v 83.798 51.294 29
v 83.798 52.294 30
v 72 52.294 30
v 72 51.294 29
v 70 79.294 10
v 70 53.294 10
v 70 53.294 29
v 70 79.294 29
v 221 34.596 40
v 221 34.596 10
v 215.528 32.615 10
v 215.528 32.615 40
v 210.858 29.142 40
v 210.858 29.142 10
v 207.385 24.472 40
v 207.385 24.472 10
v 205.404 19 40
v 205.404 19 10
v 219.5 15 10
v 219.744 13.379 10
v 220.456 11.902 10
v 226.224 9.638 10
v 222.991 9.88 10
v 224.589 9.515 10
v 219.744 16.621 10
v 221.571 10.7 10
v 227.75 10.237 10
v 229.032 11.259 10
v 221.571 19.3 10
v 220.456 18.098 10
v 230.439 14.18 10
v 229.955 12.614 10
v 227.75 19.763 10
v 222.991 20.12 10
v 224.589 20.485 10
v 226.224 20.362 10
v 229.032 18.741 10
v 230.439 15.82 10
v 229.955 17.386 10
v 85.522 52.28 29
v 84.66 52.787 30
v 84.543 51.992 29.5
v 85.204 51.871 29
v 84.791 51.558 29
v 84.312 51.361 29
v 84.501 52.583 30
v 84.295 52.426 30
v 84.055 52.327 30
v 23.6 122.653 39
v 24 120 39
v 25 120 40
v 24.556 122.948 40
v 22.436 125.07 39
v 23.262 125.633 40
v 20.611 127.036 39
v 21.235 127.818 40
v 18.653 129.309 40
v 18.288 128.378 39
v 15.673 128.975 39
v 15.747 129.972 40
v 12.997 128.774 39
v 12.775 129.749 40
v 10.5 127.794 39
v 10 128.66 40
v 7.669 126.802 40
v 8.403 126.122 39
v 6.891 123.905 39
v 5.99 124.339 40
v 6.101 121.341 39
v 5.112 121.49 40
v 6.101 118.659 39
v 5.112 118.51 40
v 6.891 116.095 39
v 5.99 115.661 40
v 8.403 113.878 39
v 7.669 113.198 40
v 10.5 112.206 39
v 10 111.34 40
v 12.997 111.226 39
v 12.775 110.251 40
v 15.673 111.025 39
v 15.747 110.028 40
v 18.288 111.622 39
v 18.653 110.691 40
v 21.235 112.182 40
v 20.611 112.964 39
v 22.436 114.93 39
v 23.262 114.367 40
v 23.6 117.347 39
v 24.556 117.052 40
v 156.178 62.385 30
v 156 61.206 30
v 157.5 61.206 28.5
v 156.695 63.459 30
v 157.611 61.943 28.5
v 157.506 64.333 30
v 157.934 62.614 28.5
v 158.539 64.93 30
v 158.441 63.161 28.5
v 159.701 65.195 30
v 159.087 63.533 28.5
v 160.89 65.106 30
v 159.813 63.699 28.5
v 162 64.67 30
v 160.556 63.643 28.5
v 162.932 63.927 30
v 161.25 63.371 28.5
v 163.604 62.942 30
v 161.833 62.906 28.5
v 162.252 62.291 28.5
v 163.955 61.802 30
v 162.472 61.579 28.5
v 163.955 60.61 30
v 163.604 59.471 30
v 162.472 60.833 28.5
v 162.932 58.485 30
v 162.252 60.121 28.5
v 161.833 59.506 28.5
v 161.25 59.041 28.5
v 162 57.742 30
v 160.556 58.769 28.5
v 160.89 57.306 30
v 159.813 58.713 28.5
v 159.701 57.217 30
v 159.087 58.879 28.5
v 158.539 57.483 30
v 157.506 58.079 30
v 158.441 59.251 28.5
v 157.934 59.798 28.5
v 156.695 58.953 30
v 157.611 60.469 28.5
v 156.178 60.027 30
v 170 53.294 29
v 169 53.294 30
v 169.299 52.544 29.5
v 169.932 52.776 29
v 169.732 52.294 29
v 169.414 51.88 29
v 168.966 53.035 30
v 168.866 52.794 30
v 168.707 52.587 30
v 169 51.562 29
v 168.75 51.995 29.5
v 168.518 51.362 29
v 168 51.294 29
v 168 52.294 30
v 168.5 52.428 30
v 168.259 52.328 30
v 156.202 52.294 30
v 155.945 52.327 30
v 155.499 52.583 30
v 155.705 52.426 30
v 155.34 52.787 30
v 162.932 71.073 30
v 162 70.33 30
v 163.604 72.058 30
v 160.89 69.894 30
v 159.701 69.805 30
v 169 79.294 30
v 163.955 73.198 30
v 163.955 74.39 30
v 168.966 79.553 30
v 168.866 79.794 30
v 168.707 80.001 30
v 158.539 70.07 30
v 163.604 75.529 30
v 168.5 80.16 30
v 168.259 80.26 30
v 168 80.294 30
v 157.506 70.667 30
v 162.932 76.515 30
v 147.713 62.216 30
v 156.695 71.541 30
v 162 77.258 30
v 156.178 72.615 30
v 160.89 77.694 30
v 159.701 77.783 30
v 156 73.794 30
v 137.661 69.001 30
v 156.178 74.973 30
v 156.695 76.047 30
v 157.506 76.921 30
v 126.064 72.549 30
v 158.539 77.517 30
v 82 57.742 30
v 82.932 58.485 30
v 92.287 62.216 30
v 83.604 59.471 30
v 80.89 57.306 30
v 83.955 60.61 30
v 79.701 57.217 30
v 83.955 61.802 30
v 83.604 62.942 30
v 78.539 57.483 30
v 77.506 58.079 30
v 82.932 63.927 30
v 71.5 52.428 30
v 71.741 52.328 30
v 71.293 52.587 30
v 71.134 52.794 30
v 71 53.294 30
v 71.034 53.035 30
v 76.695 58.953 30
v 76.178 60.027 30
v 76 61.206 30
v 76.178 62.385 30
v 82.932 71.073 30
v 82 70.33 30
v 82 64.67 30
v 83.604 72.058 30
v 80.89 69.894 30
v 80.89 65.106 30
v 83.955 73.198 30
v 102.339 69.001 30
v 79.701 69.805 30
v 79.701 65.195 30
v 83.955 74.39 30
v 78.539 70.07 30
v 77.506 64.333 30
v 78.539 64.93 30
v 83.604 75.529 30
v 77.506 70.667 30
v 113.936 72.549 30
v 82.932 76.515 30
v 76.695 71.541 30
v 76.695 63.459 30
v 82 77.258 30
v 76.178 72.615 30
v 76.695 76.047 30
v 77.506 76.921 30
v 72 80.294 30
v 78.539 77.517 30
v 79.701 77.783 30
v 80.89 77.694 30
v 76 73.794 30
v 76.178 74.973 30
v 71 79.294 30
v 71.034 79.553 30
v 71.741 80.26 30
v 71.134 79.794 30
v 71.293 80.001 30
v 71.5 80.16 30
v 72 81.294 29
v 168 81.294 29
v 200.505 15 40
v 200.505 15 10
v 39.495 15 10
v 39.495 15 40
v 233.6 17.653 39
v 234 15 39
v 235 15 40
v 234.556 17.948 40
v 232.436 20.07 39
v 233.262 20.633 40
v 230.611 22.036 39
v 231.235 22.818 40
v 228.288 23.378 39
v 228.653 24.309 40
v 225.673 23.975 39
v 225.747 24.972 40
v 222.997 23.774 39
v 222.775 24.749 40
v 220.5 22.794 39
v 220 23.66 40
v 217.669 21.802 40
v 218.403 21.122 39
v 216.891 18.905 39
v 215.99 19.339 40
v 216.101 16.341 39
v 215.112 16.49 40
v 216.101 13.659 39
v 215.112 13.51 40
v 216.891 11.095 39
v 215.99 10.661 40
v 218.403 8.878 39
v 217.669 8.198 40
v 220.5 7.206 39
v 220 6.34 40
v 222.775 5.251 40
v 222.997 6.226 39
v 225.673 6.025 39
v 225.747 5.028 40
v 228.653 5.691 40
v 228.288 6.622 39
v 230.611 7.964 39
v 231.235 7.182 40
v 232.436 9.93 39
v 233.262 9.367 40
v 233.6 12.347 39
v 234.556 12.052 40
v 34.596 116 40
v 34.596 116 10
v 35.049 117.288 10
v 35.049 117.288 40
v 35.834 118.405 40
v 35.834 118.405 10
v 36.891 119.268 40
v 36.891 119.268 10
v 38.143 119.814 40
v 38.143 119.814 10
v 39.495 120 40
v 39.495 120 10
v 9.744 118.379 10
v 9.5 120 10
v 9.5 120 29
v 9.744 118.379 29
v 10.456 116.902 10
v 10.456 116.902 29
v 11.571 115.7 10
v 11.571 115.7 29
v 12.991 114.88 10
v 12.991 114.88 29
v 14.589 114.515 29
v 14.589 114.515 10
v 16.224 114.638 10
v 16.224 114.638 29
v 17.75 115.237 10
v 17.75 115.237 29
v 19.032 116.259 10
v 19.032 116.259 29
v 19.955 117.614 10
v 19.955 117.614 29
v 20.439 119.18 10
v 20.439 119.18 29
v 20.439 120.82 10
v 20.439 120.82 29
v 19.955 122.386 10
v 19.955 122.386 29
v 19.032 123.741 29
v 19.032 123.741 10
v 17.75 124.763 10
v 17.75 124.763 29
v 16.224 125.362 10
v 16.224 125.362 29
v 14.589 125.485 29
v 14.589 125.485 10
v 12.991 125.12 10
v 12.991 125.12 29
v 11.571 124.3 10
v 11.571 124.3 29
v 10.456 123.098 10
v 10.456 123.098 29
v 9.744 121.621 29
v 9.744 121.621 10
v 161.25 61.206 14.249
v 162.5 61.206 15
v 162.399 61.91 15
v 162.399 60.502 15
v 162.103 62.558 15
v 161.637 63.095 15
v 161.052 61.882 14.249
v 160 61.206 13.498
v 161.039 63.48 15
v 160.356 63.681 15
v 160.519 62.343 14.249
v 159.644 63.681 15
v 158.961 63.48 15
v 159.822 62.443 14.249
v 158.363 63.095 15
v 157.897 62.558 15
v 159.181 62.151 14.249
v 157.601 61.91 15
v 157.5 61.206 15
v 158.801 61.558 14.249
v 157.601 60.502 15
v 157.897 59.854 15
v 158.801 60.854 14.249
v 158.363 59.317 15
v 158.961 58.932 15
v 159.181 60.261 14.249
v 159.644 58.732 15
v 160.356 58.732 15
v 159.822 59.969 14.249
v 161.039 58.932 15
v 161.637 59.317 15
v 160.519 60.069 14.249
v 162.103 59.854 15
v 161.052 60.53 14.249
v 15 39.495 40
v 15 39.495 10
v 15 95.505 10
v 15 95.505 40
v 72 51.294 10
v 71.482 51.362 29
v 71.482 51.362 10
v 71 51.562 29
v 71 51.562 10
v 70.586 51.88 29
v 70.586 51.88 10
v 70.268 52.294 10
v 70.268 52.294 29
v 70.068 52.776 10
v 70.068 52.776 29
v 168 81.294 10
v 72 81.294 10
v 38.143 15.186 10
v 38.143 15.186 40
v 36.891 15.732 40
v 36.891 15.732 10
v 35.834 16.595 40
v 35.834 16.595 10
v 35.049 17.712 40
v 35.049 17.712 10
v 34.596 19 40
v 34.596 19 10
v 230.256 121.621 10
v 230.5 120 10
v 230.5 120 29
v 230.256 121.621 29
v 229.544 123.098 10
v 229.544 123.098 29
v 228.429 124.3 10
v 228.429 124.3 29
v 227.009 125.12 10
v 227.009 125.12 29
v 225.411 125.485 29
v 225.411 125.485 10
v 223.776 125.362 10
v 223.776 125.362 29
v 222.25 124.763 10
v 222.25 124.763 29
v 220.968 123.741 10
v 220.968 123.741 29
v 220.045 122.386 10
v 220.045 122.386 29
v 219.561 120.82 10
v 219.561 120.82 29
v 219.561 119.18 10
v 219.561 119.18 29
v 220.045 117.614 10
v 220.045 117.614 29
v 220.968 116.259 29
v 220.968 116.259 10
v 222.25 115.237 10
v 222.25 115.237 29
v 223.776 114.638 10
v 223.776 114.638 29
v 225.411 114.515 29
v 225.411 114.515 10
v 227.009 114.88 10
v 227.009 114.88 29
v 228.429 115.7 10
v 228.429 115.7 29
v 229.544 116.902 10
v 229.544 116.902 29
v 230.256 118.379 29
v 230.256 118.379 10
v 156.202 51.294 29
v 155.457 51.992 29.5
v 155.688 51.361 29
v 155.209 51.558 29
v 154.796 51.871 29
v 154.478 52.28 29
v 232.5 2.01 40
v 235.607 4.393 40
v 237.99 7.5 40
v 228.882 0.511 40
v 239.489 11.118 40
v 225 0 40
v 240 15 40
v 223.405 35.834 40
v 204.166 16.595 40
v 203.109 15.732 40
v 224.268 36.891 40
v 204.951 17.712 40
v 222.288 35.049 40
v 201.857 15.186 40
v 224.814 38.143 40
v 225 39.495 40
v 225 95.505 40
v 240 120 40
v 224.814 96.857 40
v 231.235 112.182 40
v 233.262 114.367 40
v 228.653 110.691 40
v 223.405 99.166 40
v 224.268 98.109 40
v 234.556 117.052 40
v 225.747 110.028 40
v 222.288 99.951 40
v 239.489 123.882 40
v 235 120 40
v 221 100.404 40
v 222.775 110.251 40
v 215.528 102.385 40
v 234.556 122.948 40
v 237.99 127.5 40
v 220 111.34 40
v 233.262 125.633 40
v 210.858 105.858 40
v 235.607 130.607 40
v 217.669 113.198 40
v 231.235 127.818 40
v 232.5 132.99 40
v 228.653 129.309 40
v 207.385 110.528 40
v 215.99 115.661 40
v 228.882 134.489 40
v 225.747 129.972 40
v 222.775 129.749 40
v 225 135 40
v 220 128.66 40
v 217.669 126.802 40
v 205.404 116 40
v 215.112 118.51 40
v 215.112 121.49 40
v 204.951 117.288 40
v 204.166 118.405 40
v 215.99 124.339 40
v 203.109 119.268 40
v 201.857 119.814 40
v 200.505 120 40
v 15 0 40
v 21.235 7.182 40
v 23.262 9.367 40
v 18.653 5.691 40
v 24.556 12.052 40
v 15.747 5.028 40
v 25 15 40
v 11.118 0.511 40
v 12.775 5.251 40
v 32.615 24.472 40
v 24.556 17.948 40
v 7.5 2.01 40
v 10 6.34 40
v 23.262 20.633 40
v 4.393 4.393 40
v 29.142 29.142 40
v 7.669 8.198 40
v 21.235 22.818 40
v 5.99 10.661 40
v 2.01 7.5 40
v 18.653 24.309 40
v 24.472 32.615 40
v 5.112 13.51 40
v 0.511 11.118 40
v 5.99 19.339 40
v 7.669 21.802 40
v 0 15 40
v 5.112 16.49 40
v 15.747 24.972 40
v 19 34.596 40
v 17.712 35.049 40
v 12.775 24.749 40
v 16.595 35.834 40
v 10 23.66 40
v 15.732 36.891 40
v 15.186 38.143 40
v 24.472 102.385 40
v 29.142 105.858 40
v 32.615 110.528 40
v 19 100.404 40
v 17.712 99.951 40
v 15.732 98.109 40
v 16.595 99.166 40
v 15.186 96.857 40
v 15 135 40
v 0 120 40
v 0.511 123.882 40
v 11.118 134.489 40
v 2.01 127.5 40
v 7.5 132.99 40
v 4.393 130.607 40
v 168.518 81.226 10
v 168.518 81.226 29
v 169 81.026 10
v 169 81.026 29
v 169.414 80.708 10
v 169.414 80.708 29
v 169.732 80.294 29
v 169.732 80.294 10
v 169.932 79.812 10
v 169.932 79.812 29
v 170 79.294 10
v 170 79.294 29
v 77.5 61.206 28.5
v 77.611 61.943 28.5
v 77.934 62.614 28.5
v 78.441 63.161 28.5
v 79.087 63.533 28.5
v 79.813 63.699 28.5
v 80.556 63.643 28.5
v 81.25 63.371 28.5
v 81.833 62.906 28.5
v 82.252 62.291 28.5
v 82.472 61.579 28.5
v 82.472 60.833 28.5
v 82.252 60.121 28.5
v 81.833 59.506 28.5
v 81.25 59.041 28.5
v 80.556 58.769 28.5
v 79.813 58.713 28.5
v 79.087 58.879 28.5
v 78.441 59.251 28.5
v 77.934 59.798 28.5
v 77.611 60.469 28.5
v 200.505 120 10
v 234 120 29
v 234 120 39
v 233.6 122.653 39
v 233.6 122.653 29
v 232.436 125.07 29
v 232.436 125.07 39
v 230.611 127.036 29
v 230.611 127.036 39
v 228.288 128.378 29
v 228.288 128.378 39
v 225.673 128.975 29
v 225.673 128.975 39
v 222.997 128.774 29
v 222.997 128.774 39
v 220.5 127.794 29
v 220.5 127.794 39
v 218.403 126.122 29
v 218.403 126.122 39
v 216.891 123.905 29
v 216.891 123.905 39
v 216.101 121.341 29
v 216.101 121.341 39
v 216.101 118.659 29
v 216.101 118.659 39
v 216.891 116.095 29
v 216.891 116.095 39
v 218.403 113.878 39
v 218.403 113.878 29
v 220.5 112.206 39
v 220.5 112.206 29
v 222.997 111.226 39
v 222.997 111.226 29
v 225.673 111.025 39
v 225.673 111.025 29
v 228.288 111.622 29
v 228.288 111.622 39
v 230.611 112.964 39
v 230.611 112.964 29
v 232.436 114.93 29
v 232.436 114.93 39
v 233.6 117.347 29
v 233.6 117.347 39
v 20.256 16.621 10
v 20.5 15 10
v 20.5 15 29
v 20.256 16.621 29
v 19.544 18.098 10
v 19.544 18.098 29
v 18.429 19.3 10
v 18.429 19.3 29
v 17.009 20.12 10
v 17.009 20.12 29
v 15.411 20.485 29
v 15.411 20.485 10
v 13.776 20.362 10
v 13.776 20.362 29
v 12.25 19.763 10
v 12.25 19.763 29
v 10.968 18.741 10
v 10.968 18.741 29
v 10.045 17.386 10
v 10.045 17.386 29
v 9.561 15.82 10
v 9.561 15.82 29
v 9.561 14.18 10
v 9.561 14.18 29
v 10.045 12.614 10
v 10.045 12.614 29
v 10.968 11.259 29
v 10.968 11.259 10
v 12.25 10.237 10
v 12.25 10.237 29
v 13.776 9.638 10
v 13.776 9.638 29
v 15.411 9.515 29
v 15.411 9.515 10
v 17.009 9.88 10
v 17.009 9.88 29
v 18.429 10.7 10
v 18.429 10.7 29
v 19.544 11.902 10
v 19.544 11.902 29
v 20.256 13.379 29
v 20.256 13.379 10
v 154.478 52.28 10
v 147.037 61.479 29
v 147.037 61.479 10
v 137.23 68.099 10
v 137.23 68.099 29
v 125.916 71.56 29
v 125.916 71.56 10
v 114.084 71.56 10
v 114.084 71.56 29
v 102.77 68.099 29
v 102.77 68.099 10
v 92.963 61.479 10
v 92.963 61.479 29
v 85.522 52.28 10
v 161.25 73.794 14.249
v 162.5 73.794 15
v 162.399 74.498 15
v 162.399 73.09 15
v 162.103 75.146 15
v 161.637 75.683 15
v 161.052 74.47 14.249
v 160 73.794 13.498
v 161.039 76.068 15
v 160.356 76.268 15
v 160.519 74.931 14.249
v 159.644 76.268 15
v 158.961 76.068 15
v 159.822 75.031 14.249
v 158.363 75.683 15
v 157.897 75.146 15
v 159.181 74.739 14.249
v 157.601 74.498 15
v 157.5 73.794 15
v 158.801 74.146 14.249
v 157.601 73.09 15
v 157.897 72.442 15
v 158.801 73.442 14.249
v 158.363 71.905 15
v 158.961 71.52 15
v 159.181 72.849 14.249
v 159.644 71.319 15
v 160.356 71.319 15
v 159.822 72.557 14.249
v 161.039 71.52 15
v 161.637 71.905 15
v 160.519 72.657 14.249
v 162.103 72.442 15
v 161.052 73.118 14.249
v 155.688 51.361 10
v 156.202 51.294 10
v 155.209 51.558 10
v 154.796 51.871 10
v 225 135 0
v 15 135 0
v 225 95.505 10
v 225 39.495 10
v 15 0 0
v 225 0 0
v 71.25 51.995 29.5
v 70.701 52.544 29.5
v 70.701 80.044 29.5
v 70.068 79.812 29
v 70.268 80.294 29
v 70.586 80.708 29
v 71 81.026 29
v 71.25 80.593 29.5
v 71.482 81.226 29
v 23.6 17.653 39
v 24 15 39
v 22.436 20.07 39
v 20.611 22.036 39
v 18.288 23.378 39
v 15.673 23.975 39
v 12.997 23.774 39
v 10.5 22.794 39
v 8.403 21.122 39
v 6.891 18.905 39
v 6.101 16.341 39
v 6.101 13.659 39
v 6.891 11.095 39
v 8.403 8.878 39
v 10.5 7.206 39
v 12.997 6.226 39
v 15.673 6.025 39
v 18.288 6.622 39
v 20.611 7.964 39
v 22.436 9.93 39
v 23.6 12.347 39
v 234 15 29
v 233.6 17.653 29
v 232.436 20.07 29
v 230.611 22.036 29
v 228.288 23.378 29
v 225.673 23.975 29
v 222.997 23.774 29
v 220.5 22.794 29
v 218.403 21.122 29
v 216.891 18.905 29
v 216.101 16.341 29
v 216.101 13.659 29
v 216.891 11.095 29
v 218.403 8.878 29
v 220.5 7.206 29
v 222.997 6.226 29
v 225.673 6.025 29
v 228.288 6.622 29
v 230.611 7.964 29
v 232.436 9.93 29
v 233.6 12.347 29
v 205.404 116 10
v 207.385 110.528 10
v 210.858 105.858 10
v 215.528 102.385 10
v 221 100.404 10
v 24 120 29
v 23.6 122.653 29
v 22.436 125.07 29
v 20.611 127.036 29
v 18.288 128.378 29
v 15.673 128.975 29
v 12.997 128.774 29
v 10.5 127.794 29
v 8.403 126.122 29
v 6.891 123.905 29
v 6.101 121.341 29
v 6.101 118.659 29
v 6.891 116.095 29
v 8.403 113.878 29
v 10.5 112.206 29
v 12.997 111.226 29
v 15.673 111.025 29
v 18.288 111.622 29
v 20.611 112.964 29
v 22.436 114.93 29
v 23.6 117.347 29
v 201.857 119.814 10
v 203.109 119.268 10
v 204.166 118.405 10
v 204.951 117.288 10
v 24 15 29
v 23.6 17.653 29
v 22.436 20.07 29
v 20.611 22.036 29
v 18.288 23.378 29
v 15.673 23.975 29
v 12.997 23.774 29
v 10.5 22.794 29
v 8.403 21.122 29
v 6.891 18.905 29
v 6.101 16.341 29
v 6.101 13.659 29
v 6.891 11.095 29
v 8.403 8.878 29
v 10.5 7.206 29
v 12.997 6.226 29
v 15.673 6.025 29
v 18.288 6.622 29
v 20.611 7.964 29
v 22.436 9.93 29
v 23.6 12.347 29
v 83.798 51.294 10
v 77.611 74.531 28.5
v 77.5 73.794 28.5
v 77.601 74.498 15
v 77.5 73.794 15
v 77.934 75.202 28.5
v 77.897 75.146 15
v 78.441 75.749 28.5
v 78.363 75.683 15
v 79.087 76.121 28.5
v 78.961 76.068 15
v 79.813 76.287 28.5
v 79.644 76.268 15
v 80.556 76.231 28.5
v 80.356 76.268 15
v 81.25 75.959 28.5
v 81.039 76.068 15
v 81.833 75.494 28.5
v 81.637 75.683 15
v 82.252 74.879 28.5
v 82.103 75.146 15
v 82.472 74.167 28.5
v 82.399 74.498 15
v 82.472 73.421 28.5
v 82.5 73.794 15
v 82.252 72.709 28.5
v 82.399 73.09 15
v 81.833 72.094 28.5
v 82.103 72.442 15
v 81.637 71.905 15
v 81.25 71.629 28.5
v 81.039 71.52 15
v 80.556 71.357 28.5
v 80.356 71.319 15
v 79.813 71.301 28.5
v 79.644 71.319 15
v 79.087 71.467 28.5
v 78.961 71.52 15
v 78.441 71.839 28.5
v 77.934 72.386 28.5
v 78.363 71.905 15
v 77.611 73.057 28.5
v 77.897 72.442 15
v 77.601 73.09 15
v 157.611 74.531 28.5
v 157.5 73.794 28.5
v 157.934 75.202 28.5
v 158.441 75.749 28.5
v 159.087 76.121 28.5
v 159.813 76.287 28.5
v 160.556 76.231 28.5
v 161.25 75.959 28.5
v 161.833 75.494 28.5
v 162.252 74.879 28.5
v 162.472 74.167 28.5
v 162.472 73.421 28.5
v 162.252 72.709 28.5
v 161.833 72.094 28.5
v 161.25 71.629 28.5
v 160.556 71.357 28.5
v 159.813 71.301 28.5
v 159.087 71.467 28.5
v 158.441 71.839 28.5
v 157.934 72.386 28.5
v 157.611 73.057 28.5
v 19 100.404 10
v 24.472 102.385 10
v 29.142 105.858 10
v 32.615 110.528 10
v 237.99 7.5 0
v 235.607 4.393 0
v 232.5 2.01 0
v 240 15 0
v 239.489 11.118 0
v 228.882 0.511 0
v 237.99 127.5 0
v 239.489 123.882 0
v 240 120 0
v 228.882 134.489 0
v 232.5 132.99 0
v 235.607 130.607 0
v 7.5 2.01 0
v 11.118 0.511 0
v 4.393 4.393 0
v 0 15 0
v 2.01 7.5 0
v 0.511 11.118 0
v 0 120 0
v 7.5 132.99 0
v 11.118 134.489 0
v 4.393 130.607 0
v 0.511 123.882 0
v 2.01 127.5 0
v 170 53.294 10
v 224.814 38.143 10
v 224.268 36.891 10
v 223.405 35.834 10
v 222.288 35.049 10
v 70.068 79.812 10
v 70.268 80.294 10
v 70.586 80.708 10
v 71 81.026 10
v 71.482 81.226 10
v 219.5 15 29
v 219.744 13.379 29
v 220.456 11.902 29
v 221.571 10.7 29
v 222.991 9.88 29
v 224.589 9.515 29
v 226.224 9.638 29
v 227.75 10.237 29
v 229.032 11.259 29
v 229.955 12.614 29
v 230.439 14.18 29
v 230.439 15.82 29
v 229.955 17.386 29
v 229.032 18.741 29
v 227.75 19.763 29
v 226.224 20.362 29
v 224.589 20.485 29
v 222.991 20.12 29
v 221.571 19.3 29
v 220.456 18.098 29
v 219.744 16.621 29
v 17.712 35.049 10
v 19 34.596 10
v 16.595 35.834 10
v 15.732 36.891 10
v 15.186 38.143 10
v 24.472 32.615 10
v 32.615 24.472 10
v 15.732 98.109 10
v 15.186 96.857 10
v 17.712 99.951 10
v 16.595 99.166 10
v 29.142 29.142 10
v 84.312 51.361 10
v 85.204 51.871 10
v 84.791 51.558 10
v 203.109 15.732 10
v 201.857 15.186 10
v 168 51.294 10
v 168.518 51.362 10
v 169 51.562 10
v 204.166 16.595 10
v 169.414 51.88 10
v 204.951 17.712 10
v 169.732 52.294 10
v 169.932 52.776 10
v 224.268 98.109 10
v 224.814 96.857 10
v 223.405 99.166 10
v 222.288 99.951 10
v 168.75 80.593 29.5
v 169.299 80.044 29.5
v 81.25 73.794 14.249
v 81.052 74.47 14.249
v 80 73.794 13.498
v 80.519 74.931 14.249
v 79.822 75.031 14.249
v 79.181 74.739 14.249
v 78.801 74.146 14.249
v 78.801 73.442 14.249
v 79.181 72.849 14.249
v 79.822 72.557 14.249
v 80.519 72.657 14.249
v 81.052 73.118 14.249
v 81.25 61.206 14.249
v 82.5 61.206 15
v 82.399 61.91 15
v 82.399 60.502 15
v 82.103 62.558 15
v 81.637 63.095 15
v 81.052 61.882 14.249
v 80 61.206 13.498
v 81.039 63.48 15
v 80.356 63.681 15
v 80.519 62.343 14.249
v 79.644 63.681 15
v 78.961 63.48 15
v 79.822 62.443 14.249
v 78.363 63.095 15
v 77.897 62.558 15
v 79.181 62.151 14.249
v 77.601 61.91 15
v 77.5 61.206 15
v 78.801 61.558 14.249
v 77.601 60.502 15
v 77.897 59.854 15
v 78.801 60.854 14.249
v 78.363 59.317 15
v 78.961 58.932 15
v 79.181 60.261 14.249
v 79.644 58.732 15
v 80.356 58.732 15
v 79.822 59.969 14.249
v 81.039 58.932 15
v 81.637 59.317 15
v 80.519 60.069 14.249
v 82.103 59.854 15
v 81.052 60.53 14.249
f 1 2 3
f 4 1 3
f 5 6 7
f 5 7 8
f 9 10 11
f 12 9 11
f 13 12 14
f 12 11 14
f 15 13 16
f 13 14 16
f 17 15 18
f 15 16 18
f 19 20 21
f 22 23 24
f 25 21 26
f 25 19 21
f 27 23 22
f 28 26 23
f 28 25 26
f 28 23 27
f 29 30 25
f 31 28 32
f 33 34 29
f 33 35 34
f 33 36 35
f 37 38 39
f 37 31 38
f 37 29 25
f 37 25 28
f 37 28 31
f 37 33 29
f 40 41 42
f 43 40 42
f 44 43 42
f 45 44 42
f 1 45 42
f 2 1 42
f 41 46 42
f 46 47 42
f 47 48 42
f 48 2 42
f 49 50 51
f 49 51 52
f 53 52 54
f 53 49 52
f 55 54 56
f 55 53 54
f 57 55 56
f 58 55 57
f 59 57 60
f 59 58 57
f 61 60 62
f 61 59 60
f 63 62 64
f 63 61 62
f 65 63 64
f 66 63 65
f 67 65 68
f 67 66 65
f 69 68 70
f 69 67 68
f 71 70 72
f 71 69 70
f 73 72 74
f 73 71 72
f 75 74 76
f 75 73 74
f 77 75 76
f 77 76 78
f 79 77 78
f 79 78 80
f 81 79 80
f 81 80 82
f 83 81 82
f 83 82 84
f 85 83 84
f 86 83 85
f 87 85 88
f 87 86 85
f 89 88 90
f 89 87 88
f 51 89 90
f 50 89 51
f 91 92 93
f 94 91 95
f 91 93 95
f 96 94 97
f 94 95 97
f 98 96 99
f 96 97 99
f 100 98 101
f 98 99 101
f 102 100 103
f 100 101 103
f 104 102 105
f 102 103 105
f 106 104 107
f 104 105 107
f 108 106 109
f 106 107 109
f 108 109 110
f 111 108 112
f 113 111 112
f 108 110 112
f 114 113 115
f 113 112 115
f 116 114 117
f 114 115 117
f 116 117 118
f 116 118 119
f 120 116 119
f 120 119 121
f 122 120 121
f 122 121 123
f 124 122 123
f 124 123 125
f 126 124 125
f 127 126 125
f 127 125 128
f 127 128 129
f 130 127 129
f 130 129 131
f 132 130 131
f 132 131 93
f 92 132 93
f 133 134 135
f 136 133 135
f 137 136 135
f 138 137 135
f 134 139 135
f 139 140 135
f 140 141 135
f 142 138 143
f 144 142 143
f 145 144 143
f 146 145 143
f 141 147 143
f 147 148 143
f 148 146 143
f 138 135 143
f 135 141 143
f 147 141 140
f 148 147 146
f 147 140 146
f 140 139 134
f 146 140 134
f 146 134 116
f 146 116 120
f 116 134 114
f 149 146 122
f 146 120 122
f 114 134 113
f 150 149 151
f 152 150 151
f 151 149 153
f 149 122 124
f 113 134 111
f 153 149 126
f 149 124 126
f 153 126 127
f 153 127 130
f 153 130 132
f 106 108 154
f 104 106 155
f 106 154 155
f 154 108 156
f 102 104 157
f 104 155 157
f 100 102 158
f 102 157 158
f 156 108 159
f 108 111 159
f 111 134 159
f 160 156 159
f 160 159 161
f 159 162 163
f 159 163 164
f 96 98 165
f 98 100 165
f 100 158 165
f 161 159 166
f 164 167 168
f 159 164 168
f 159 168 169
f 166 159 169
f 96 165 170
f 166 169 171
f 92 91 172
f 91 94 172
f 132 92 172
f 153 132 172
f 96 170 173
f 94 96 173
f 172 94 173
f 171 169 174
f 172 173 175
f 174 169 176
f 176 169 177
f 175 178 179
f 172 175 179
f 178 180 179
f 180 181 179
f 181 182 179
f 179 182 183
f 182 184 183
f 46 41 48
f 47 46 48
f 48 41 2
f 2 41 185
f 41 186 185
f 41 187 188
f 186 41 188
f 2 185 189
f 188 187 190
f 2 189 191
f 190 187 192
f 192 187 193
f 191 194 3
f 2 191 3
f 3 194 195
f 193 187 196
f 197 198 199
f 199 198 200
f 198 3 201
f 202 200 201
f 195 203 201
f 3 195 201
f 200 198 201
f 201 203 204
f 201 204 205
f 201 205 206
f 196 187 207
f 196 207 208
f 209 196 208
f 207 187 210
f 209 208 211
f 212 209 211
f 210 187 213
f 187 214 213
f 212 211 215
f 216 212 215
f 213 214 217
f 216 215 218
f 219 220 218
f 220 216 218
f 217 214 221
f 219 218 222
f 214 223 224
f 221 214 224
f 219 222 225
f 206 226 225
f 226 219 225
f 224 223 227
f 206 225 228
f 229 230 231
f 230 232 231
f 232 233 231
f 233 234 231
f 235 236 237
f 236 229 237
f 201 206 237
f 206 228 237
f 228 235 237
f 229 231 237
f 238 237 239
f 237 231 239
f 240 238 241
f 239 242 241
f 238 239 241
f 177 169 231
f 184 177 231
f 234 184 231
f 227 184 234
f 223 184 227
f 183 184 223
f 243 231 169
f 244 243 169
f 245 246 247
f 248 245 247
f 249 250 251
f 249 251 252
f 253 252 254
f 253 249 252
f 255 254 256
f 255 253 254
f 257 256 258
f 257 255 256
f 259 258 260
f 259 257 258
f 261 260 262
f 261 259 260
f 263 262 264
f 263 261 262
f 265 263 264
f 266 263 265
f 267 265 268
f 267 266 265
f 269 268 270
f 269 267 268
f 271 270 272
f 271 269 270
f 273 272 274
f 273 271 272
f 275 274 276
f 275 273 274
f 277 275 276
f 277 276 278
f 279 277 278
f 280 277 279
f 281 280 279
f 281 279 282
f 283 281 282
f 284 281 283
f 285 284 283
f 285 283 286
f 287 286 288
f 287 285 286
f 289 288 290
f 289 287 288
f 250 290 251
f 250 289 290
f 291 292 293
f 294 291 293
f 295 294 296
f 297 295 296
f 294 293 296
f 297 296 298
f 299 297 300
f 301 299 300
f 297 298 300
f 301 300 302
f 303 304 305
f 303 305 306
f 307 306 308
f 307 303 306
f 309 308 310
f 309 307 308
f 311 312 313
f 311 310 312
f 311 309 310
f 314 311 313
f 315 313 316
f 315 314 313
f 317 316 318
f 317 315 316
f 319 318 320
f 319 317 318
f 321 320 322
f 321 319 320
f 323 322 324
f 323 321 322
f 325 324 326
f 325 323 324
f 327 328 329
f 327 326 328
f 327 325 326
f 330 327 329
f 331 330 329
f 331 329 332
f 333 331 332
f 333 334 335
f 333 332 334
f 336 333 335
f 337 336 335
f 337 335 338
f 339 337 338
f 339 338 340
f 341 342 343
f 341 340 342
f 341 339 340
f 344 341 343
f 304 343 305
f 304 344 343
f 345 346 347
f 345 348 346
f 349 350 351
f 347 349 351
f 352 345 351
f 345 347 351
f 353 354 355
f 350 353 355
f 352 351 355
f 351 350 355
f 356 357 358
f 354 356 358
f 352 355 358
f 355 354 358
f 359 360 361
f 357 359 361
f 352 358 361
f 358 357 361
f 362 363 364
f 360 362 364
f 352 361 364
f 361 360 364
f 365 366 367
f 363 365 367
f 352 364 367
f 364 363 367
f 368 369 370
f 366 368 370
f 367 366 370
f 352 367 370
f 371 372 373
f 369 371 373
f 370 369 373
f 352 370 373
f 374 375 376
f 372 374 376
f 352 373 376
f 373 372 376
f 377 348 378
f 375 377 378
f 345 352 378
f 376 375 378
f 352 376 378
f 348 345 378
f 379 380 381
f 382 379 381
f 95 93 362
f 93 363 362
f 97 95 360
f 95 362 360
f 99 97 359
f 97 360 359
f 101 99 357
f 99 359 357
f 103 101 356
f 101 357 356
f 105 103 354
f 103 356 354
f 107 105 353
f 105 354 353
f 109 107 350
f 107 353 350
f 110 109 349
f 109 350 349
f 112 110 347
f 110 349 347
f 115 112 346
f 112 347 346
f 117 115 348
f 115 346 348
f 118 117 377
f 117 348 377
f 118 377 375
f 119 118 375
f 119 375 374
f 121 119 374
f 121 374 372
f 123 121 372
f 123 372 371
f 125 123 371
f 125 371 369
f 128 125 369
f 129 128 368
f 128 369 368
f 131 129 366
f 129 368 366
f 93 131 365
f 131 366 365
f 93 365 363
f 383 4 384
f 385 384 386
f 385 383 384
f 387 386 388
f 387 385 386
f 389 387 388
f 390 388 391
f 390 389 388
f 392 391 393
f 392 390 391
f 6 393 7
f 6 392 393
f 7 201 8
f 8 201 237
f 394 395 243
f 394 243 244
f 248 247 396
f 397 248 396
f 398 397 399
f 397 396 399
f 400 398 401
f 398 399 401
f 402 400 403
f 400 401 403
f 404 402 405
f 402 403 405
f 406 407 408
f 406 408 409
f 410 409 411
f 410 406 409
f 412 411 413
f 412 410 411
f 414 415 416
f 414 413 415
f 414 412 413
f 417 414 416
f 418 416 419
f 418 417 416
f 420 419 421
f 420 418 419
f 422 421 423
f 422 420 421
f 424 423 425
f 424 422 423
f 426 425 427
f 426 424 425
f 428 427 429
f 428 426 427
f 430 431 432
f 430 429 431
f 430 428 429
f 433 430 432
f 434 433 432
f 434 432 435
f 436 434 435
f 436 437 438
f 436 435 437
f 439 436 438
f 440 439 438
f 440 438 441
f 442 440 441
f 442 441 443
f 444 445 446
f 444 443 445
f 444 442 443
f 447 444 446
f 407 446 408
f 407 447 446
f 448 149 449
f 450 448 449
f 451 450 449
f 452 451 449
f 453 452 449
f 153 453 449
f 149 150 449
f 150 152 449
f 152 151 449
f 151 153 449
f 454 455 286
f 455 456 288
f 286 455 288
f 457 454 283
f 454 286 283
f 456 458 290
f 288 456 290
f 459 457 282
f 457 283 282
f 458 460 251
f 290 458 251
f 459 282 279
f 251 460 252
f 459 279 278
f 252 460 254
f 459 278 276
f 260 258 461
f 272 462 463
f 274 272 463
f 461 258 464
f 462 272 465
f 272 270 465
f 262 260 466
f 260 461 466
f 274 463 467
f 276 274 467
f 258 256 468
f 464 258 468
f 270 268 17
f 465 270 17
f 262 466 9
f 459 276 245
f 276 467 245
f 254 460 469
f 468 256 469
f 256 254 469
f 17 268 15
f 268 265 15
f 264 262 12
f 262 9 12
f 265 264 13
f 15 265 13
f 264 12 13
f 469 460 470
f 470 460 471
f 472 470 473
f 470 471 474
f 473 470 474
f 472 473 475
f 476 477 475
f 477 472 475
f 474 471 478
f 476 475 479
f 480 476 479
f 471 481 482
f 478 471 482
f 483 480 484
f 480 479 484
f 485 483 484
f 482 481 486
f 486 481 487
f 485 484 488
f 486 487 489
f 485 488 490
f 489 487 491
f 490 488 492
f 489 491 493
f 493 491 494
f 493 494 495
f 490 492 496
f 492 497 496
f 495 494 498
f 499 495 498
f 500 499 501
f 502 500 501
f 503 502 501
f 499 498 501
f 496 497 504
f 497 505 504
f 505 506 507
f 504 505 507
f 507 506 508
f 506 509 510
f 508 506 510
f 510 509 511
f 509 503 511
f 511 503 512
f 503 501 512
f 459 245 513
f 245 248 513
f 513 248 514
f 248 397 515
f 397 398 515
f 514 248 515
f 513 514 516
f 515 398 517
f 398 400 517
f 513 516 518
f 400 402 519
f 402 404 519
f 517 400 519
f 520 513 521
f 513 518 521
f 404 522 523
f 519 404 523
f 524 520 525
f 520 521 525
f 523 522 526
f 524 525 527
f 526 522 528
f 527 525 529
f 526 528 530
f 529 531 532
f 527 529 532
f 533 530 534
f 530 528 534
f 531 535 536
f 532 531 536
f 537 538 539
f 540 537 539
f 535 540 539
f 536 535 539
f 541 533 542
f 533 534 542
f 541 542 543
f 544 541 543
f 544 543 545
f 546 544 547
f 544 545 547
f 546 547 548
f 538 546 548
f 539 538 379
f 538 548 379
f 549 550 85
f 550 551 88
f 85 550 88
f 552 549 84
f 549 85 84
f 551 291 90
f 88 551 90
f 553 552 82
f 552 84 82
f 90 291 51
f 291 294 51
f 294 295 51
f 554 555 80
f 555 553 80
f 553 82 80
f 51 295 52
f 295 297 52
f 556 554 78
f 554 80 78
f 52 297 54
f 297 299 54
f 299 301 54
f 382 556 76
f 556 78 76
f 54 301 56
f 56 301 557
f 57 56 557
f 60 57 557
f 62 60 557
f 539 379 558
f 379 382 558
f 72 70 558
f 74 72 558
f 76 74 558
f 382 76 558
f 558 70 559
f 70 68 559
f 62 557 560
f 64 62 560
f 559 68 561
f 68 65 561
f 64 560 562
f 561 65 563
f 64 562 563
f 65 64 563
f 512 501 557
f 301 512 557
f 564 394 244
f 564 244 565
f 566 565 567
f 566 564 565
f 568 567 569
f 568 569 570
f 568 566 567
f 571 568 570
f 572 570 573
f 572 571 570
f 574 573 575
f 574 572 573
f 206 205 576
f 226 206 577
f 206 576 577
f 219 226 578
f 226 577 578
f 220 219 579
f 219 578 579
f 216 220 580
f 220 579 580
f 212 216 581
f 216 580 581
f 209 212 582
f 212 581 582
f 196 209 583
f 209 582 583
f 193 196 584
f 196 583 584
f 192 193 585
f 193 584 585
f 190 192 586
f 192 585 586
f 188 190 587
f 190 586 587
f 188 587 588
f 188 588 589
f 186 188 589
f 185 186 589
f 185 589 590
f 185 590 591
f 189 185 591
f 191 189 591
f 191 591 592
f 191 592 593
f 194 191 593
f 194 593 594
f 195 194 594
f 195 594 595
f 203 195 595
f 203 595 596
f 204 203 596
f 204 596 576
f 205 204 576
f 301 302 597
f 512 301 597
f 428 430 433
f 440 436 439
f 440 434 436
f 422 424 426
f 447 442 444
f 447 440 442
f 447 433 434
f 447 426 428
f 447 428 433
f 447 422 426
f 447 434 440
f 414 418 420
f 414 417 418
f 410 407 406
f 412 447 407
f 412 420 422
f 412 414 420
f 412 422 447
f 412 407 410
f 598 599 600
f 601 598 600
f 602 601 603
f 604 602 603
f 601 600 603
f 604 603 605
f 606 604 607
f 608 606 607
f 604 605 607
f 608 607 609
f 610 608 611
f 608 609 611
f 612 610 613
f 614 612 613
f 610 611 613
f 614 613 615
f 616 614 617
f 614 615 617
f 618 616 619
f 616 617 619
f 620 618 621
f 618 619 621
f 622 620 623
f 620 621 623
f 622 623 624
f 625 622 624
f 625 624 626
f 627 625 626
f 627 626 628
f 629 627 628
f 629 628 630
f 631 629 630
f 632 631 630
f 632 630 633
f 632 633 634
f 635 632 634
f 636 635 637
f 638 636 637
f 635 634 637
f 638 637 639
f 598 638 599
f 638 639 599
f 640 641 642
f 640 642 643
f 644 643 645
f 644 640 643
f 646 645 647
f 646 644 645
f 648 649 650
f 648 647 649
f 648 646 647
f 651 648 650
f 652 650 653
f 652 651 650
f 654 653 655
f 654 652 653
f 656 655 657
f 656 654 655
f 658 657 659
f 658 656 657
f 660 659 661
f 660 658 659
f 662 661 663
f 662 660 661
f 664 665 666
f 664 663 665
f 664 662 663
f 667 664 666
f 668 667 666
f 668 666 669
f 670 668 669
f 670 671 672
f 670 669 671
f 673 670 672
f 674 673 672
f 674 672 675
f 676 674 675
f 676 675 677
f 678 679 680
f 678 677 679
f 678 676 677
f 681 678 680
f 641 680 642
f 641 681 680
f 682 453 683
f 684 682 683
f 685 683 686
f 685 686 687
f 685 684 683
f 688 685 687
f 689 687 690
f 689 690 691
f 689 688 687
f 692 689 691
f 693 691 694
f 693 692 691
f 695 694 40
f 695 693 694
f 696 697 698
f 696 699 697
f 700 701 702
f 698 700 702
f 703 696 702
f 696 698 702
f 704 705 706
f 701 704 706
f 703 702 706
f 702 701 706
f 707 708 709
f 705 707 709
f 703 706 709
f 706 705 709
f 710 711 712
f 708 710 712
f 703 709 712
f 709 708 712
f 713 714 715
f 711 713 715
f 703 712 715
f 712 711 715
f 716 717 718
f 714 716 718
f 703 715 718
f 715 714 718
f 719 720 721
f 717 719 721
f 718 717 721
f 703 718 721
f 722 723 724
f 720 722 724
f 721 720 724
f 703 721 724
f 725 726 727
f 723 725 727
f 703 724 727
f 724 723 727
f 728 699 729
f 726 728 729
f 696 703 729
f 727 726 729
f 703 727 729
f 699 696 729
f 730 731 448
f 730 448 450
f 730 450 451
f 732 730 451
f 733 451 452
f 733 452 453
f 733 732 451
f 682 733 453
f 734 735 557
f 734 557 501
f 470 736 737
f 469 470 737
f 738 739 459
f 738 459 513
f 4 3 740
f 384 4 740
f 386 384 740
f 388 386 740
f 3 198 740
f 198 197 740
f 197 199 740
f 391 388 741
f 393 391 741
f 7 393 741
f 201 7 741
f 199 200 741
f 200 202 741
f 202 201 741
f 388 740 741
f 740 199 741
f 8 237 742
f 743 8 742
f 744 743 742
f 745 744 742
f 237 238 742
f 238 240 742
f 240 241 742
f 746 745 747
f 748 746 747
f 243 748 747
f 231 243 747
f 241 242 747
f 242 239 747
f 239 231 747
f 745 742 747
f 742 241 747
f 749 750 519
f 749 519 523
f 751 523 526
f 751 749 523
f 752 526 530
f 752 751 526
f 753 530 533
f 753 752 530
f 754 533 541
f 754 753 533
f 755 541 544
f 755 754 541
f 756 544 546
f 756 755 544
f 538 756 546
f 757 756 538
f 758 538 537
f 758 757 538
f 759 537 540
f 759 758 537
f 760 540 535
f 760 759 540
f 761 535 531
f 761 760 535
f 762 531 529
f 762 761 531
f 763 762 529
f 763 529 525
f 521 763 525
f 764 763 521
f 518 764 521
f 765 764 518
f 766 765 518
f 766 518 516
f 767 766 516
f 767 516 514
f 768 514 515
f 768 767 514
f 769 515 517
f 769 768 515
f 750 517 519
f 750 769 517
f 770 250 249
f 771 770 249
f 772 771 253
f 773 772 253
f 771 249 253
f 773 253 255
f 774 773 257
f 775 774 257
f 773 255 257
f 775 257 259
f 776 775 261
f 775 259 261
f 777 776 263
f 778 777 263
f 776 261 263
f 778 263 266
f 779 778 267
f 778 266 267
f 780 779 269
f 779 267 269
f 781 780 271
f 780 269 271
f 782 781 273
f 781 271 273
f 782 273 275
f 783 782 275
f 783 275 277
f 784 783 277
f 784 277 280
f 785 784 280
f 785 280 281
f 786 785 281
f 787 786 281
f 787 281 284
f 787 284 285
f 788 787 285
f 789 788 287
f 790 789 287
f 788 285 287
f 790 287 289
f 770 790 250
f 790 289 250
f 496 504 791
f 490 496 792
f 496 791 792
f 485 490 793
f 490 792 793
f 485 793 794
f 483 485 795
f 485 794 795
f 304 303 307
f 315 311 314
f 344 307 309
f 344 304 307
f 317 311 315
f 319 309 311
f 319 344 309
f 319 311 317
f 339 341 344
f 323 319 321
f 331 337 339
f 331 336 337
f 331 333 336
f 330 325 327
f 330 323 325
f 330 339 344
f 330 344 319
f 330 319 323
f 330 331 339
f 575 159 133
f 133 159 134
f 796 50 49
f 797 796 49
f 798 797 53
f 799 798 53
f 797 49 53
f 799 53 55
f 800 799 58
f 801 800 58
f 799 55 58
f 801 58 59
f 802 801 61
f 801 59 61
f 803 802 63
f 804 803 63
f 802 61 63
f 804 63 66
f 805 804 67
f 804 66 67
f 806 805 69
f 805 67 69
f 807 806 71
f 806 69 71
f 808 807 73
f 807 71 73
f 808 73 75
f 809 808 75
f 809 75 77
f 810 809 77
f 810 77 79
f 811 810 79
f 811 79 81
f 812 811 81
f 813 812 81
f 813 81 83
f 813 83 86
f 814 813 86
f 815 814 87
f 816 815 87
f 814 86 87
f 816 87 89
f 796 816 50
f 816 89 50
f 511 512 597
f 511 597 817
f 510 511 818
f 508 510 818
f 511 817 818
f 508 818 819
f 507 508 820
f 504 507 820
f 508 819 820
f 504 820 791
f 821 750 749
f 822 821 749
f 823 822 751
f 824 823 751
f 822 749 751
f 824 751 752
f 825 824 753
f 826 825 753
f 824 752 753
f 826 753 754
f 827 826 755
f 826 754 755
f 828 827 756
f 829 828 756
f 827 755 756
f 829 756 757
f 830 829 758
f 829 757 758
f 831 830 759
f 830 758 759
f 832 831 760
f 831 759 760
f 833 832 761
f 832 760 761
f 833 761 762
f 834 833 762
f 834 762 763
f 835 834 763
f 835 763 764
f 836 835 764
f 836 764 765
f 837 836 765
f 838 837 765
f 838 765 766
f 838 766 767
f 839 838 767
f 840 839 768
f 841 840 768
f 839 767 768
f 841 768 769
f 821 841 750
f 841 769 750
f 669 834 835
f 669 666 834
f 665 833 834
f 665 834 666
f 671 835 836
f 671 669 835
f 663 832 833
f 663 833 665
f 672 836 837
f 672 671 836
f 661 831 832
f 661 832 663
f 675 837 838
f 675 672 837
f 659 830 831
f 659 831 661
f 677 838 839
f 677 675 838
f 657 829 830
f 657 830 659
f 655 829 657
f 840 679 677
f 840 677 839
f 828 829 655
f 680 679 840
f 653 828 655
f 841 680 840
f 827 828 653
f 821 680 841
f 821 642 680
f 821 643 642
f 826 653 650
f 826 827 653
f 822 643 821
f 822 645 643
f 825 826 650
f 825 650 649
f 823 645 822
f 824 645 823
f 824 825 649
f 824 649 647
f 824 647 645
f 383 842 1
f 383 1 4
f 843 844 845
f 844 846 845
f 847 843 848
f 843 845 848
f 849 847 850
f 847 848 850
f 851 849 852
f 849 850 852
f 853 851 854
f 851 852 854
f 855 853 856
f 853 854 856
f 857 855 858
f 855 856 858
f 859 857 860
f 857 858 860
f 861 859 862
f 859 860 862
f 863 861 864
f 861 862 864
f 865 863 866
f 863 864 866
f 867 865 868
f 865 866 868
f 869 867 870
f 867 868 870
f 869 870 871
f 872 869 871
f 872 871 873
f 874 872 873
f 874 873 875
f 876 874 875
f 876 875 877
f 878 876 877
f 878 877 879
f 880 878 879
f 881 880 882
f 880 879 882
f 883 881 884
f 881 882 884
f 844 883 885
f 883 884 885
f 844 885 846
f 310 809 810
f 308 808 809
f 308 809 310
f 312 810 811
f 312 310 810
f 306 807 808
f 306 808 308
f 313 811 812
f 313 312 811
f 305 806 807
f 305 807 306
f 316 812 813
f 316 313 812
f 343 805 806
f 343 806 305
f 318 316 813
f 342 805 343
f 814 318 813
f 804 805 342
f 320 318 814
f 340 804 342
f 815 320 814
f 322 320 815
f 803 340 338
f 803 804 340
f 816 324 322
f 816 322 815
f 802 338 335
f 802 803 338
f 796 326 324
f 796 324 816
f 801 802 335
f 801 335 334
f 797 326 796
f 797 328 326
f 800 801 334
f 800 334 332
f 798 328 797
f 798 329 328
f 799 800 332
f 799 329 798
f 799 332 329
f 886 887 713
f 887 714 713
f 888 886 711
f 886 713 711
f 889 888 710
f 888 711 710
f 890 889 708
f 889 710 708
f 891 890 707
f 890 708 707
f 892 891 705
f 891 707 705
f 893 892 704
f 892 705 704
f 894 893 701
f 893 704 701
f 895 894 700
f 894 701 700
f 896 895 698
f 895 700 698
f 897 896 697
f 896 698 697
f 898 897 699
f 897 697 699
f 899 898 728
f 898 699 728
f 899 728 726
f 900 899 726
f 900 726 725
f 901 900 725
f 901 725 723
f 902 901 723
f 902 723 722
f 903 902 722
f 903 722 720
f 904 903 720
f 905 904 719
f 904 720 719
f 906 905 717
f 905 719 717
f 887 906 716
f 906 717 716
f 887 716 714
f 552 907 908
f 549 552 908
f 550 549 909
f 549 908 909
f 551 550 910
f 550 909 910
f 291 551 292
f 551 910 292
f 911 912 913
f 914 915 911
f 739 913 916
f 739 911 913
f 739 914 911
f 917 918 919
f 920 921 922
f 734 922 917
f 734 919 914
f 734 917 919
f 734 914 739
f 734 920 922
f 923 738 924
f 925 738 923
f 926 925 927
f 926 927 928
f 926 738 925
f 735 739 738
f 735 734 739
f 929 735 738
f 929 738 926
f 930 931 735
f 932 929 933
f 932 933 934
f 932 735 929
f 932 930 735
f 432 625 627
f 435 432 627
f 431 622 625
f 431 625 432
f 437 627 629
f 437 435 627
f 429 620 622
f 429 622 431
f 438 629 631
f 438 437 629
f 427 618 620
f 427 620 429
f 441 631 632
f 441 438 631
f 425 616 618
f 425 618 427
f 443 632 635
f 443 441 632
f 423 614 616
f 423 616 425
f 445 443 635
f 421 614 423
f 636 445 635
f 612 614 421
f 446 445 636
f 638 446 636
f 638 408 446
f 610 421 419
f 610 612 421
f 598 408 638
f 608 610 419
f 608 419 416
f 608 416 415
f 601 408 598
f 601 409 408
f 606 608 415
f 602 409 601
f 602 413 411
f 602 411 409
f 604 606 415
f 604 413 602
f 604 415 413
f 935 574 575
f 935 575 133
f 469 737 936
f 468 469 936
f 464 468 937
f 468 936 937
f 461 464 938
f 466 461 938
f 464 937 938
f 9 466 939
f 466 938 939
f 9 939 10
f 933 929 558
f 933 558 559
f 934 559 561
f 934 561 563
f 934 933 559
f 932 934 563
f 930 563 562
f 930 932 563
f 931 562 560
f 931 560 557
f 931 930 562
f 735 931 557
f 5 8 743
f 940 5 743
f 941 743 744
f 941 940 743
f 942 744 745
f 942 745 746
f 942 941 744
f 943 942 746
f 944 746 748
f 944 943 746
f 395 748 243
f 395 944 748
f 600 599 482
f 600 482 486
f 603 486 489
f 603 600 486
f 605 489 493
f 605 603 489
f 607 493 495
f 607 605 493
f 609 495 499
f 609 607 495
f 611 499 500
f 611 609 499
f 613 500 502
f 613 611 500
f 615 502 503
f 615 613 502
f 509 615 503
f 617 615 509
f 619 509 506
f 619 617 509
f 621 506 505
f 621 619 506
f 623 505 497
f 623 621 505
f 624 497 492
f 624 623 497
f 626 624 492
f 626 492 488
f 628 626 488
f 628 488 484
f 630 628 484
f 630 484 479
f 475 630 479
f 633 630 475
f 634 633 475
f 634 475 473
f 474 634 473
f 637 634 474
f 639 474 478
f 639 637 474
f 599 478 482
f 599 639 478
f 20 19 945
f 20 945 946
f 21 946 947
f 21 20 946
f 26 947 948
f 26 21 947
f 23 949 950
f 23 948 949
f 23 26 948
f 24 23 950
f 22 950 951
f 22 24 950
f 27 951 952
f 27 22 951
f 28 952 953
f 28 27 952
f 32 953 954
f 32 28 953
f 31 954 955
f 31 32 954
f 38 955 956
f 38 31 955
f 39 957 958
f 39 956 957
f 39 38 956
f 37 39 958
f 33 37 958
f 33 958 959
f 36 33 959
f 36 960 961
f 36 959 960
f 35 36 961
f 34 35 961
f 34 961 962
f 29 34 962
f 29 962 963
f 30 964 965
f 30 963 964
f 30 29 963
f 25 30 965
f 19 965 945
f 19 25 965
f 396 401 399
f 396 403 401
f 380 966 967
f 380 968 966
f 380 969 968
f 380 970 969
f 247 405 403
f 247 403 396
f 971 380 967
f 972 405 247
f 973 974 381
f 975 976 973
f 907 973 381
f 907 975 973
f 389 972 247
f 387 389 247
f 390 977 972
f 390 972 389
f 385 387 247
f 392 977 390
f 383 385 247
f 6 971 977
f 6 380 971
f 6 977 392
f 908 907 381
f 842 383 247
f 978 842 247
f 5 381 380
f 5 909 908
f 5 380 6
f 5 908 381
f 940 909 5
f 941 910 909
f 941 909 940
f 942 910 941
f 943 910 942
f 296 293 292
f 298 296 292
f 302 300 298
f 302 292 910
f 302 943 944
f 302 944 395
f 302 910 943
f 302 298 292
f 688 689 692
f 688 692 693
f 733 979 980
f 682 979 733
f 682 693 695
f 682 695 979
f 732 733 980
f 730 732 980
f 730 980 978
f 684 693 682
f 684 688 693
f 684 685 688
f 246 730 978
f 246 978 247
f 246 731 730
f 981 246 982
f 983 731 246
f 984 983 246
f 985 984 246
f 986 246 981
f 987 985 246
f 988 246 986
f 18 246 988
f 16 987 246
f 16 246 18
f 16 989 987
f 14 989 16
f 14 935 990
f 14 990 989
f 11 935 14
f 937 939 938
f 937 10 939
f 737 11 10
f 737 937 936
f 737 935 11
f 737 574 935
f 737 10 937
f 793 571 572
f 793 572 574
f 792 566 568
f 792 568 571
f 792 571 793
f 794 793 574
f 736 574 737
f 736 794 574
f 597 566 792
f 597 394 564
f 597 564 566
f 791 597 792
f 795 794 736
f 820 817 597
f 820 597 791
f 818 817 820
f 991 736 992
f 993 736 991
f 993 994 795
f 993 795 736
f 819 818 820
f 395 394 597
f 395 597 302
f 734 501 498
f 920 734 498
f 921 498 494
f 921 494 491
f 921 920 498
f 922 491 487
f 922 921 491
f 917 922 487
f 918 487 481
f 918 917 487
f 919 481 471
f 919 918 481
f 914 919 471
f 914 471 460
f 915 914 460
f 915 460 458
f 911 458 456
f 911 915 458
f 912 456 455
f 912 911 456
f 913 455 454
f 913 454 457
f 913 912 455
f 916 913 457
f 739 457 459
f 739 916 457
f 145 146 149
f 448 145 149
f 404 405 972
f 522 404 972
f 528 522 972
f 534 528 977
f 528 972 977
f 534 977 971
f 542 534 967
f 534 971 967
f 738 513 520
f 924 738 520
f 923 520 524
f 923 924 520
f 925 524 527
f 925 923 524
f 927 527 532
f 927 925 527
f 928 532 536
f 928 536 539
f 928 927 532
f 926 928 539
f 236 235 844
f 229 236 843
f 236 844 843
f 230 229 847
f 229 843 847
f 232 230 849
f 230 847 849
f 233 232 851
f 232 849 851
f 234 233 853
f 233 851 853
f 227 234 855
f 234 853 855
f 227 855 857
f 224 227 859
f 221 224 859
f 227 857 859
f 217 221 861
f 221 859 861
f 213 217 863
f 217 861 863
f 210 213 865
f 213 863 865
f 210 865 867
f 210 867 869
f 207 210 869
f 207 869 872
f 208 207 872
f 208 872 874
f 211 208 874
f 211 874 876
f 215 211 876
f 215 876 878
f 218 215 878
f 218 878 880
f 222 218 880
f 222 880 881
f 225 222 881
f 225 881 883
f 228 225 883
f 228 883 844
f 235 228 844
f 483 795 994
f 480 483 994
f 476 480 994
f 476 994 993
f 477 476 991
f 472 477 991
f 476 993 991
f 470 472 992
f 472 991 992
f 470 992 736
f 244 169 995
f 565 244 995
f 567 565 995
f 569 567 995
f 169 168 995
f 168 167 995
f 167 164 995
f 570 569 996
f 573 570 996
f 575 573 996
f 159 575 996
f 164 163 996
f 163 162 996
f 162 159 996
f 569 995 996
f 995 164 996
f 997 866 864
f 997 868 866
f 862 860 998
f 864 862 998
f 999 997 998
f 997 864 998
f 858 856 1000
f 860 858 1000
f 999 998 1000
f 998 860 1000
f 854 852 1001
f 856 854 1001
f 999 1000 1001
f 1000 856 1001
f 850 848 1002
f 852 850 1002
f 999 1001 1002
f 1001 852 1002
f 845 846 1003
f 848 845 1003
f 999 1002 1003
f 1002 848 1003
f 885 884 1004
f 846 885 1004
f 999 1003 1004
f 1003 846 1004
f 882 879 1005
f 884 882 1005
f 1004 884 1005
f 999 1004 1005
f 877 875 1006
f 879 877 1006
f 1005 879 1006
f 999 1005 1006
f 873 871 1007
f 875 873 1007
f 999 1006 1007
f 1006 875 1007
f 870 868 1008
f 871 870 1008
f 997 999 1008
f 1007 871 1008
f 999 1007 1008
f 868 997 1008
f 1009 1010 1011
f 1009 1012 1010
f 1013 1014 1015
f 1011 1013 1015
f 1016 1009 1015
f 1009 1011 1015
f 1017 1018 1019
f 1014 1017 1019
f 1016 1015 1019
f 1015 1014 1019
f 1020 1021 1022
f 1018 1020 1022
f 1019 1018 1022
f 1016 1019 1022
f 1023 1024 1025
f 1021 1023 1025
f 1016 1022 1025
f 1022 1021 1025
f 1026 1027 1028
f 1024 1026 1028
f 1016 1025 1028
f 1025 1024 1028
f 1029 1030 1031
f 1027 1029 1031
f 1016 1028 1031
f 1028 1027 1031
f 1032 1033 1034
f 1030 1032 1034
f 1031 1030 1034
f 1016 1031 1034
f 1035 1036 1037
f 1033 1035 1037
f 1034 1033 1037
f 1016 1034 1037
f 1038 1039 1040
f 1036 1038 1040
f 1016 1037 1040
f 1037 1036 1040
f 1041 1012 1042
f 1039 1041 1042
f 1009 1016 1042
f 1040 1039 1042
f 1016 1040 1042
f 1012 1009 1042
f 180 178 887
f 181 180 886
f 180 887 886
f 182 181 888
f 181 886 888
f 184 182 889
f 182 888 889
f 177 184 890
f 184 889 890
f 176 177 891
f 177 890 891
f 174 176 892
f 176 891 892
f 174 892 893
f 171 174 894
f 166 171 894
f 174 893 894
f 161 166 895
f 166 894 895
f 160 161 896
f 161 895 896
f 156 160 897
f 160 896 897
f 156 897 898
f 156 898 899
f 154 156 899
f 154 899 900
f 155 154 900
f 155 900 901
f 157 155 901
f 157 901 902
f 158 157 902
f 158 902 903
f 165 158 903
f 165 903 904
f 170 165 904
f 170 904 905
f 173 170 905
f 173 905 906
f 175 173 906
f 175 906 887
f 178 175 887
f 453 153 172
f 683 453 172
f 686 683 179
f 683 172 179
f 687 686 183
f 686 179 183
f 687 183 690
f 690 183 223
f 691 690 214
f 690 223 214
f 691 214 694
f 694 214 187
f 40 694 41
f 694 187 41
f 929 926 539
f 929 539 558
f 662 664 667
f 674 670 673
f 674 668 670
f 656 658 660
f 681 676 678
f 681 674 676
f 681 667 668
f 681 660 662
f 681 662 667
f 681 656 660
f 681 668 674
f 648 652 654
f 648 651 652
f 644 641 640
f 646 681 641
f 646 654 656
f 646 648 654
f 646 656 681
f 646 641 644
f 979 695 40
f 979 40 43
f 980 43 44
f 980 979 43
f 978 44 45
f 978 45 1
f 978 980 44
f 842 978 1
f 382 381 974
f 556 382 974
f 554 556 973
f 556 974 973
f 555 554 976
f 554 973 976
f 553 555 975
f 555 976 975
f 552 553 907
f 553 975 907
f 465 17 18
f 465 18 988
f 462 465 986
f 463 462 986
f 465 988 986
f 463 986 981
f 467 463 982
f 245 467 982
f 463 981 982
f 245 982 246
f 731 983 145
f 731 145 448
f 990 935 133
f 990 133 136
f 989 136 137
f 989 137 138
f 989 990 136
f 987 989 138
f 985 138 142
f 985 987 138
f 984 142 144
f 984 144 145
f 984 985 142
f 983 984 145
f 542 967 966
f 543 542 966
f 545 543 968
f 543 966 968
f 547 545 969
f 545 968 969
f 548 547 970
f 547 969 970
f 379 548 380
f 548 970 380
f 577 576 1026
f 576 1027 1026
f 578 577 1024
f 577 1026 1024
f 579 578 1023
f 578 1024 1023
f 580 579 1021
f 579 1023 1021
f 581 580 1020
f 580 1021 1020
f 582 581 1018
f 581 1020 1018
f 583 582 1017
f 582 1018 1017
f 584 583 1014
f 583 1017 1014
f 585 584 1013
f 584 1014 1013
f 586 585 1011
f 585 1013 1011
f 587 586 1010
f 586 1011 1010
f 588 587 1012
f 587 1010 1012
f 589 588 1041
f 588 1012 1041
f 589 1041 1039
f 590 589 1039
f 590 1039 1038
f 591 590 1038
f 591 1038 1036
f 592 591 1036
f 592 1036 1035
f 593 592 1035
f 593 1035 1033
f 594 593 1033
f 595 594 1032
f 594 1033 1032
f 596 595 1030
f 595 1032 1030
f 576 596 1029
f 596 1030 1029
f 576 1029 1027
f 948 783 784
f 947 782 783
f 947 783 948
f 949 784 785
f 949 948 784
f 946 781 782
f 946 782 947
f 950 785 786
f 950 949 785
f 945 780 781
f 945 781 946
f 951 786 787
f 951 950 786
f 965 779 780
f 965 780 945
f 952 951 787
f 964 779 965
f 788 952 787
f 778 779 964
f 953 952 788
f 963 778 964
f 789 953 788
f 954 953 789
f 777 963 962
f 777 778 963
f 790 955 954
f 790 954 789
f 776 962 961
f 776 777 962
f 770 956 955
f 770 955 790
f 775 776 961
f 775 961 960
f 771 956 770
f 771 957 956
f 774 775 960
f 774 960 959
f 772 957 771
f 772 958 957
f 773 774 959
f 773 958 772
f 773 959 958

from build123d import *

# Parameters (mm, degrees)
SKETCH_1_R                   = 5.5
EXTRUDE_1_DEPTH              = 40
EXTRUDE_2_DEPTH              = 10
EXTRUDE_3_DEPTH              = 20
HOLE_WIZARD_M6_3_D           = 5
HOLE_WIZARD_M6_3_DEPTH       = 15
HOLE_WIZARD_M6_3_CSINK_D     = 8
HOLE_WIZARD_M6_3_CSINK_ANGLE = 90
HOLE_WIZARD_M6_3_TIP         = 1.502151548
SKETCH_9_R                   = 9
CUT_EXTRUDE_1_DEPTH          = 11
CHAMFER_2_SIZE               = 1
CHAMFER_3_SIZE               = 1


with BuildPart() as part:
    # 草图1 → 凸台-拉伸1 (new body)
    with BuildSketch(Plane.XY):
        with BuildLine():
            Line((0, 15), (0, 120))
            ThreePointArc((0, 120), (4.393398282, 130.606601718), (15, 135))
            Line((15, 135), (225, 135))
            ThreePointArc((225, 135), (235.606601718, 130.606601718), (240, 120))
            Line((240, 120), (240, 15))
            ThreePointArc((240, 15), (235.606601718, 4.393398282), (225, 0))
            Line((225, 0), (15, 0))
            ThreePointArc((15, 0), (4.393398282, 4.393398282), (0, 15))
        make_face()
        with Locations((225, 120)):
            Circle(SKETCH_1_R, mode=Mode.SUBTRACT)
        with Locations(Location((225, 15, 0), (0, 0, 180))):
            Circle(SKETCH_1_R, mode=Mode.SUBTRACT)
        with Locations((15, 15)):
            Circle(SKETCH_1_R, mode=Mode.SUBTRACT)
        with Locations(Location((15, 120, 0), (0, 0, 180))):
            Circle(SKETCH_1_R, mode=Mode.SUBTRACT)
        with BuildLine():
            Line((15, 39.494897428), (15, 95.505102572))
            ThreePointArc((15, 95.505102572), (16.127016654, 98.667380232), (19, 100.404082058))
            ThreePointArc((19, 100.404082058), (29.142135624, 105.857864376), (34.595917942, 116))
            ThreePointArc((34.595917942, 116), (36.332619768, 118.872983346), (39.494897428, 120))
            Line((39.494897428, 120), (200.505102572, 120))
            ThreePointArc((200.505102572, 120), (203.667380232, 118.872983346), (205.404082058, 116))
            ThreePointArc((205.404082058, 116), (210.857864376, 105.857864376), (221, 100.404082058))
            ThreePointArc((221, 100.404082058), (223.872983346, 98.667380232), (225, 95.505102572))
            Line((225, 95.505102572), (225, 39.494897428))
            ThreePointArc((225, 39.494897428), (223.872983346, 36.332619768), (221, 34.595917942))
            ThreePointArc((221, 34.595917942), (210.857864376, 29.142135624), (205.404082058, 19))
            ThreePointArc((205.404082058, 19), (203.667380232, 16.127016654), (200.505102572, 15))
            Line((200.505102572, 15), (39.494897428, 15))
            ThreePointArc((39.494897428, 15), (36.332619768, 16.127016654), (34.595917942, 19))
            ThreePointArc((34.595917942, 19), (29.142135624, 29.142135624), (19, 34.595917942))
            ThreePointArc((19, 34.595917942), (16.127016654, 36.332619768), (15, 39.494897428))
        make_face(mode=Mode.SUBTRACT)
    extrude(amount=EXTRUDE_1_DEPTH)

    # 草图2 → 凸台-拉伸2 (add)
    with BuildSketch(Plane(origin=(0, 0, 0), x_dir=(-1, 0, 0), z_dir=(0, 0, -1))):
        with BuildLine():
            Line((-225, 135), (-15, 135))
            ThreePointArc((-15, 135), (-4.393398282, 130.606601718), (0, 120))
            Line((0, 120), (0, 15))
            ThreePointArc((0, 15), (-4.393398282, 4.393398282), (-15, 0))
            Line((-15, 0), (-225, 0))
            ThreePointArc((-225, 0), (-235.606601718, 4.393398282), (-240, 15))
            Line((-240, 15), (-240, 120))
            ThreePointArc((-240, 120), (-235.606601718, 130.606601718), (-225, 135))
        make_face()
    extrude(amount=-EXTRUDE_2_DEPTH)

    # 草图3 → 凸台-拉伸3 (add)
    with BuildSketch(Plane.XY.offset(10)):
        with BuildLine():
            Line((72, 81.293943495), (168, 81.293943495))
            ThreePointArc((168, 81.293943495), (169.414213562, 80.708157058), (170, 79.293943495))
            Line((170, 79.293943495), (170, 53.293943495))
            ThreePointArc((170, 53.293943495), (169.414213562, 51.879729933), (168, 51.293943495))
            Line((168, 51.293943495), (156.201767504, 51.293943495))
            ThreePointArc((156.201767504, 51.293943495), (155.208790822, 51.557856715), (154.477873813, 52.279946186))
            ThreePointArc((154.477873813, 52.279946186), (120, 72), (85.522126187, 52.279946186))
            ThreePointArc((85.522126187, 52.279946186), (84.791209178, 51.557856715), (83.798232496, 51.293943495))
            Line((83.798232496, 51.293943495), (72, 51.293943495))
            ThreePointArc((72, 51.293943495), (70.585786438, 51.879729933), (70, 53.293943495))
            Line((70, 53.293943495), (70, 79.293943495))
            ThreePointArc((70, 79.293943495), (70.585786438, 80.708157058), (72, 81.293943495))
        make_face()
    extrude(amount=EXTRUDE_3_DEPTH)

    # M6 螺纹孔3
    with Locations(Plane(origin=(80, 73.793943495, 30), x_dir=(1, 0, 0), z_dir=(0, 0, 1))):
        with Locations((0, 0), (0, -12.58788699), (80, 0), (80, -12.58788699)):
            CounterSinkHole(HOLE_WIZARD_M6_3_D / 2, HOLE_WIZARD_M6_3_CSINK_D / 2, depth=HOLE_WIZARD_M6_3_DEPTH, counter_sink_angle=HOLE_WIZARD_M6_3_CSINK_ANGLE)
            with Locations((0, 0, -(HOLE_WIZARD_M6_3_DEPTH + HOLE_WIZARD_M6_3_TIP / 2))):  # 118° drill point
                Cone(0, HOLE_WIZARD_M6_3_D / 2, HOLE_WIZARD_M6_3_TIP, mode=Mode.SUBTRACT)

    # 草图9 → 切除-拉伸1 (cut)
    with BuildSketch(Plane.XY.offset(40)):
        with Locations((15, 120)):
            Circle(SKETCH_9_R)
        with Locations((15, 15)):
            Circle(SKETCH_9_R)
        with Locations((225, 120)):
            Circle(SKETCH_9_R)
        with Locations((225, 15)):
            Circle(SKETCH_9_R)
    extrude(amount=-CUT_EXTRUDE_1_DEPTH, mode=Mode.SUBTRACT)

    # 倒角2
    chamfer_2_edges = [part.edges().sort_by_distance(p)[0] for p in [
        (6, 15, 40),
        (216, 120, 40),
        (216, 15, 40),
        (6, 120, 40),
    ]]
    chamfer(chamfer_2_edges, length=CHAMFER_2_SIZE)

    # 倒角3
    chamfer_3_edges = [part.edges().sort_by_distance(p)[0] for p in [
        (70.585786438, 51.879729933, 30),
        (155.208790822, 51.557856715, 30),
        (162.100883752, 51.293943495, 30),
        (169.414213562, 51.879729933, 30),
        (170, 66.293943495, 30),
        (169.414213562, 80.708157058, 30),
        (120, 81.293943495, 30),
        (70.585786438, 80.708157058, 30),
        (70, 66.293943495, 30),
        (77.899116248, 51.293943495, 30),
        (84.791209178, 51.557856715, 30),
        (120, 72, 30),
    ]]
    chamfer(chamfer_3_edges, length=CHAMFER_3_SIZE)


solid = part.part
